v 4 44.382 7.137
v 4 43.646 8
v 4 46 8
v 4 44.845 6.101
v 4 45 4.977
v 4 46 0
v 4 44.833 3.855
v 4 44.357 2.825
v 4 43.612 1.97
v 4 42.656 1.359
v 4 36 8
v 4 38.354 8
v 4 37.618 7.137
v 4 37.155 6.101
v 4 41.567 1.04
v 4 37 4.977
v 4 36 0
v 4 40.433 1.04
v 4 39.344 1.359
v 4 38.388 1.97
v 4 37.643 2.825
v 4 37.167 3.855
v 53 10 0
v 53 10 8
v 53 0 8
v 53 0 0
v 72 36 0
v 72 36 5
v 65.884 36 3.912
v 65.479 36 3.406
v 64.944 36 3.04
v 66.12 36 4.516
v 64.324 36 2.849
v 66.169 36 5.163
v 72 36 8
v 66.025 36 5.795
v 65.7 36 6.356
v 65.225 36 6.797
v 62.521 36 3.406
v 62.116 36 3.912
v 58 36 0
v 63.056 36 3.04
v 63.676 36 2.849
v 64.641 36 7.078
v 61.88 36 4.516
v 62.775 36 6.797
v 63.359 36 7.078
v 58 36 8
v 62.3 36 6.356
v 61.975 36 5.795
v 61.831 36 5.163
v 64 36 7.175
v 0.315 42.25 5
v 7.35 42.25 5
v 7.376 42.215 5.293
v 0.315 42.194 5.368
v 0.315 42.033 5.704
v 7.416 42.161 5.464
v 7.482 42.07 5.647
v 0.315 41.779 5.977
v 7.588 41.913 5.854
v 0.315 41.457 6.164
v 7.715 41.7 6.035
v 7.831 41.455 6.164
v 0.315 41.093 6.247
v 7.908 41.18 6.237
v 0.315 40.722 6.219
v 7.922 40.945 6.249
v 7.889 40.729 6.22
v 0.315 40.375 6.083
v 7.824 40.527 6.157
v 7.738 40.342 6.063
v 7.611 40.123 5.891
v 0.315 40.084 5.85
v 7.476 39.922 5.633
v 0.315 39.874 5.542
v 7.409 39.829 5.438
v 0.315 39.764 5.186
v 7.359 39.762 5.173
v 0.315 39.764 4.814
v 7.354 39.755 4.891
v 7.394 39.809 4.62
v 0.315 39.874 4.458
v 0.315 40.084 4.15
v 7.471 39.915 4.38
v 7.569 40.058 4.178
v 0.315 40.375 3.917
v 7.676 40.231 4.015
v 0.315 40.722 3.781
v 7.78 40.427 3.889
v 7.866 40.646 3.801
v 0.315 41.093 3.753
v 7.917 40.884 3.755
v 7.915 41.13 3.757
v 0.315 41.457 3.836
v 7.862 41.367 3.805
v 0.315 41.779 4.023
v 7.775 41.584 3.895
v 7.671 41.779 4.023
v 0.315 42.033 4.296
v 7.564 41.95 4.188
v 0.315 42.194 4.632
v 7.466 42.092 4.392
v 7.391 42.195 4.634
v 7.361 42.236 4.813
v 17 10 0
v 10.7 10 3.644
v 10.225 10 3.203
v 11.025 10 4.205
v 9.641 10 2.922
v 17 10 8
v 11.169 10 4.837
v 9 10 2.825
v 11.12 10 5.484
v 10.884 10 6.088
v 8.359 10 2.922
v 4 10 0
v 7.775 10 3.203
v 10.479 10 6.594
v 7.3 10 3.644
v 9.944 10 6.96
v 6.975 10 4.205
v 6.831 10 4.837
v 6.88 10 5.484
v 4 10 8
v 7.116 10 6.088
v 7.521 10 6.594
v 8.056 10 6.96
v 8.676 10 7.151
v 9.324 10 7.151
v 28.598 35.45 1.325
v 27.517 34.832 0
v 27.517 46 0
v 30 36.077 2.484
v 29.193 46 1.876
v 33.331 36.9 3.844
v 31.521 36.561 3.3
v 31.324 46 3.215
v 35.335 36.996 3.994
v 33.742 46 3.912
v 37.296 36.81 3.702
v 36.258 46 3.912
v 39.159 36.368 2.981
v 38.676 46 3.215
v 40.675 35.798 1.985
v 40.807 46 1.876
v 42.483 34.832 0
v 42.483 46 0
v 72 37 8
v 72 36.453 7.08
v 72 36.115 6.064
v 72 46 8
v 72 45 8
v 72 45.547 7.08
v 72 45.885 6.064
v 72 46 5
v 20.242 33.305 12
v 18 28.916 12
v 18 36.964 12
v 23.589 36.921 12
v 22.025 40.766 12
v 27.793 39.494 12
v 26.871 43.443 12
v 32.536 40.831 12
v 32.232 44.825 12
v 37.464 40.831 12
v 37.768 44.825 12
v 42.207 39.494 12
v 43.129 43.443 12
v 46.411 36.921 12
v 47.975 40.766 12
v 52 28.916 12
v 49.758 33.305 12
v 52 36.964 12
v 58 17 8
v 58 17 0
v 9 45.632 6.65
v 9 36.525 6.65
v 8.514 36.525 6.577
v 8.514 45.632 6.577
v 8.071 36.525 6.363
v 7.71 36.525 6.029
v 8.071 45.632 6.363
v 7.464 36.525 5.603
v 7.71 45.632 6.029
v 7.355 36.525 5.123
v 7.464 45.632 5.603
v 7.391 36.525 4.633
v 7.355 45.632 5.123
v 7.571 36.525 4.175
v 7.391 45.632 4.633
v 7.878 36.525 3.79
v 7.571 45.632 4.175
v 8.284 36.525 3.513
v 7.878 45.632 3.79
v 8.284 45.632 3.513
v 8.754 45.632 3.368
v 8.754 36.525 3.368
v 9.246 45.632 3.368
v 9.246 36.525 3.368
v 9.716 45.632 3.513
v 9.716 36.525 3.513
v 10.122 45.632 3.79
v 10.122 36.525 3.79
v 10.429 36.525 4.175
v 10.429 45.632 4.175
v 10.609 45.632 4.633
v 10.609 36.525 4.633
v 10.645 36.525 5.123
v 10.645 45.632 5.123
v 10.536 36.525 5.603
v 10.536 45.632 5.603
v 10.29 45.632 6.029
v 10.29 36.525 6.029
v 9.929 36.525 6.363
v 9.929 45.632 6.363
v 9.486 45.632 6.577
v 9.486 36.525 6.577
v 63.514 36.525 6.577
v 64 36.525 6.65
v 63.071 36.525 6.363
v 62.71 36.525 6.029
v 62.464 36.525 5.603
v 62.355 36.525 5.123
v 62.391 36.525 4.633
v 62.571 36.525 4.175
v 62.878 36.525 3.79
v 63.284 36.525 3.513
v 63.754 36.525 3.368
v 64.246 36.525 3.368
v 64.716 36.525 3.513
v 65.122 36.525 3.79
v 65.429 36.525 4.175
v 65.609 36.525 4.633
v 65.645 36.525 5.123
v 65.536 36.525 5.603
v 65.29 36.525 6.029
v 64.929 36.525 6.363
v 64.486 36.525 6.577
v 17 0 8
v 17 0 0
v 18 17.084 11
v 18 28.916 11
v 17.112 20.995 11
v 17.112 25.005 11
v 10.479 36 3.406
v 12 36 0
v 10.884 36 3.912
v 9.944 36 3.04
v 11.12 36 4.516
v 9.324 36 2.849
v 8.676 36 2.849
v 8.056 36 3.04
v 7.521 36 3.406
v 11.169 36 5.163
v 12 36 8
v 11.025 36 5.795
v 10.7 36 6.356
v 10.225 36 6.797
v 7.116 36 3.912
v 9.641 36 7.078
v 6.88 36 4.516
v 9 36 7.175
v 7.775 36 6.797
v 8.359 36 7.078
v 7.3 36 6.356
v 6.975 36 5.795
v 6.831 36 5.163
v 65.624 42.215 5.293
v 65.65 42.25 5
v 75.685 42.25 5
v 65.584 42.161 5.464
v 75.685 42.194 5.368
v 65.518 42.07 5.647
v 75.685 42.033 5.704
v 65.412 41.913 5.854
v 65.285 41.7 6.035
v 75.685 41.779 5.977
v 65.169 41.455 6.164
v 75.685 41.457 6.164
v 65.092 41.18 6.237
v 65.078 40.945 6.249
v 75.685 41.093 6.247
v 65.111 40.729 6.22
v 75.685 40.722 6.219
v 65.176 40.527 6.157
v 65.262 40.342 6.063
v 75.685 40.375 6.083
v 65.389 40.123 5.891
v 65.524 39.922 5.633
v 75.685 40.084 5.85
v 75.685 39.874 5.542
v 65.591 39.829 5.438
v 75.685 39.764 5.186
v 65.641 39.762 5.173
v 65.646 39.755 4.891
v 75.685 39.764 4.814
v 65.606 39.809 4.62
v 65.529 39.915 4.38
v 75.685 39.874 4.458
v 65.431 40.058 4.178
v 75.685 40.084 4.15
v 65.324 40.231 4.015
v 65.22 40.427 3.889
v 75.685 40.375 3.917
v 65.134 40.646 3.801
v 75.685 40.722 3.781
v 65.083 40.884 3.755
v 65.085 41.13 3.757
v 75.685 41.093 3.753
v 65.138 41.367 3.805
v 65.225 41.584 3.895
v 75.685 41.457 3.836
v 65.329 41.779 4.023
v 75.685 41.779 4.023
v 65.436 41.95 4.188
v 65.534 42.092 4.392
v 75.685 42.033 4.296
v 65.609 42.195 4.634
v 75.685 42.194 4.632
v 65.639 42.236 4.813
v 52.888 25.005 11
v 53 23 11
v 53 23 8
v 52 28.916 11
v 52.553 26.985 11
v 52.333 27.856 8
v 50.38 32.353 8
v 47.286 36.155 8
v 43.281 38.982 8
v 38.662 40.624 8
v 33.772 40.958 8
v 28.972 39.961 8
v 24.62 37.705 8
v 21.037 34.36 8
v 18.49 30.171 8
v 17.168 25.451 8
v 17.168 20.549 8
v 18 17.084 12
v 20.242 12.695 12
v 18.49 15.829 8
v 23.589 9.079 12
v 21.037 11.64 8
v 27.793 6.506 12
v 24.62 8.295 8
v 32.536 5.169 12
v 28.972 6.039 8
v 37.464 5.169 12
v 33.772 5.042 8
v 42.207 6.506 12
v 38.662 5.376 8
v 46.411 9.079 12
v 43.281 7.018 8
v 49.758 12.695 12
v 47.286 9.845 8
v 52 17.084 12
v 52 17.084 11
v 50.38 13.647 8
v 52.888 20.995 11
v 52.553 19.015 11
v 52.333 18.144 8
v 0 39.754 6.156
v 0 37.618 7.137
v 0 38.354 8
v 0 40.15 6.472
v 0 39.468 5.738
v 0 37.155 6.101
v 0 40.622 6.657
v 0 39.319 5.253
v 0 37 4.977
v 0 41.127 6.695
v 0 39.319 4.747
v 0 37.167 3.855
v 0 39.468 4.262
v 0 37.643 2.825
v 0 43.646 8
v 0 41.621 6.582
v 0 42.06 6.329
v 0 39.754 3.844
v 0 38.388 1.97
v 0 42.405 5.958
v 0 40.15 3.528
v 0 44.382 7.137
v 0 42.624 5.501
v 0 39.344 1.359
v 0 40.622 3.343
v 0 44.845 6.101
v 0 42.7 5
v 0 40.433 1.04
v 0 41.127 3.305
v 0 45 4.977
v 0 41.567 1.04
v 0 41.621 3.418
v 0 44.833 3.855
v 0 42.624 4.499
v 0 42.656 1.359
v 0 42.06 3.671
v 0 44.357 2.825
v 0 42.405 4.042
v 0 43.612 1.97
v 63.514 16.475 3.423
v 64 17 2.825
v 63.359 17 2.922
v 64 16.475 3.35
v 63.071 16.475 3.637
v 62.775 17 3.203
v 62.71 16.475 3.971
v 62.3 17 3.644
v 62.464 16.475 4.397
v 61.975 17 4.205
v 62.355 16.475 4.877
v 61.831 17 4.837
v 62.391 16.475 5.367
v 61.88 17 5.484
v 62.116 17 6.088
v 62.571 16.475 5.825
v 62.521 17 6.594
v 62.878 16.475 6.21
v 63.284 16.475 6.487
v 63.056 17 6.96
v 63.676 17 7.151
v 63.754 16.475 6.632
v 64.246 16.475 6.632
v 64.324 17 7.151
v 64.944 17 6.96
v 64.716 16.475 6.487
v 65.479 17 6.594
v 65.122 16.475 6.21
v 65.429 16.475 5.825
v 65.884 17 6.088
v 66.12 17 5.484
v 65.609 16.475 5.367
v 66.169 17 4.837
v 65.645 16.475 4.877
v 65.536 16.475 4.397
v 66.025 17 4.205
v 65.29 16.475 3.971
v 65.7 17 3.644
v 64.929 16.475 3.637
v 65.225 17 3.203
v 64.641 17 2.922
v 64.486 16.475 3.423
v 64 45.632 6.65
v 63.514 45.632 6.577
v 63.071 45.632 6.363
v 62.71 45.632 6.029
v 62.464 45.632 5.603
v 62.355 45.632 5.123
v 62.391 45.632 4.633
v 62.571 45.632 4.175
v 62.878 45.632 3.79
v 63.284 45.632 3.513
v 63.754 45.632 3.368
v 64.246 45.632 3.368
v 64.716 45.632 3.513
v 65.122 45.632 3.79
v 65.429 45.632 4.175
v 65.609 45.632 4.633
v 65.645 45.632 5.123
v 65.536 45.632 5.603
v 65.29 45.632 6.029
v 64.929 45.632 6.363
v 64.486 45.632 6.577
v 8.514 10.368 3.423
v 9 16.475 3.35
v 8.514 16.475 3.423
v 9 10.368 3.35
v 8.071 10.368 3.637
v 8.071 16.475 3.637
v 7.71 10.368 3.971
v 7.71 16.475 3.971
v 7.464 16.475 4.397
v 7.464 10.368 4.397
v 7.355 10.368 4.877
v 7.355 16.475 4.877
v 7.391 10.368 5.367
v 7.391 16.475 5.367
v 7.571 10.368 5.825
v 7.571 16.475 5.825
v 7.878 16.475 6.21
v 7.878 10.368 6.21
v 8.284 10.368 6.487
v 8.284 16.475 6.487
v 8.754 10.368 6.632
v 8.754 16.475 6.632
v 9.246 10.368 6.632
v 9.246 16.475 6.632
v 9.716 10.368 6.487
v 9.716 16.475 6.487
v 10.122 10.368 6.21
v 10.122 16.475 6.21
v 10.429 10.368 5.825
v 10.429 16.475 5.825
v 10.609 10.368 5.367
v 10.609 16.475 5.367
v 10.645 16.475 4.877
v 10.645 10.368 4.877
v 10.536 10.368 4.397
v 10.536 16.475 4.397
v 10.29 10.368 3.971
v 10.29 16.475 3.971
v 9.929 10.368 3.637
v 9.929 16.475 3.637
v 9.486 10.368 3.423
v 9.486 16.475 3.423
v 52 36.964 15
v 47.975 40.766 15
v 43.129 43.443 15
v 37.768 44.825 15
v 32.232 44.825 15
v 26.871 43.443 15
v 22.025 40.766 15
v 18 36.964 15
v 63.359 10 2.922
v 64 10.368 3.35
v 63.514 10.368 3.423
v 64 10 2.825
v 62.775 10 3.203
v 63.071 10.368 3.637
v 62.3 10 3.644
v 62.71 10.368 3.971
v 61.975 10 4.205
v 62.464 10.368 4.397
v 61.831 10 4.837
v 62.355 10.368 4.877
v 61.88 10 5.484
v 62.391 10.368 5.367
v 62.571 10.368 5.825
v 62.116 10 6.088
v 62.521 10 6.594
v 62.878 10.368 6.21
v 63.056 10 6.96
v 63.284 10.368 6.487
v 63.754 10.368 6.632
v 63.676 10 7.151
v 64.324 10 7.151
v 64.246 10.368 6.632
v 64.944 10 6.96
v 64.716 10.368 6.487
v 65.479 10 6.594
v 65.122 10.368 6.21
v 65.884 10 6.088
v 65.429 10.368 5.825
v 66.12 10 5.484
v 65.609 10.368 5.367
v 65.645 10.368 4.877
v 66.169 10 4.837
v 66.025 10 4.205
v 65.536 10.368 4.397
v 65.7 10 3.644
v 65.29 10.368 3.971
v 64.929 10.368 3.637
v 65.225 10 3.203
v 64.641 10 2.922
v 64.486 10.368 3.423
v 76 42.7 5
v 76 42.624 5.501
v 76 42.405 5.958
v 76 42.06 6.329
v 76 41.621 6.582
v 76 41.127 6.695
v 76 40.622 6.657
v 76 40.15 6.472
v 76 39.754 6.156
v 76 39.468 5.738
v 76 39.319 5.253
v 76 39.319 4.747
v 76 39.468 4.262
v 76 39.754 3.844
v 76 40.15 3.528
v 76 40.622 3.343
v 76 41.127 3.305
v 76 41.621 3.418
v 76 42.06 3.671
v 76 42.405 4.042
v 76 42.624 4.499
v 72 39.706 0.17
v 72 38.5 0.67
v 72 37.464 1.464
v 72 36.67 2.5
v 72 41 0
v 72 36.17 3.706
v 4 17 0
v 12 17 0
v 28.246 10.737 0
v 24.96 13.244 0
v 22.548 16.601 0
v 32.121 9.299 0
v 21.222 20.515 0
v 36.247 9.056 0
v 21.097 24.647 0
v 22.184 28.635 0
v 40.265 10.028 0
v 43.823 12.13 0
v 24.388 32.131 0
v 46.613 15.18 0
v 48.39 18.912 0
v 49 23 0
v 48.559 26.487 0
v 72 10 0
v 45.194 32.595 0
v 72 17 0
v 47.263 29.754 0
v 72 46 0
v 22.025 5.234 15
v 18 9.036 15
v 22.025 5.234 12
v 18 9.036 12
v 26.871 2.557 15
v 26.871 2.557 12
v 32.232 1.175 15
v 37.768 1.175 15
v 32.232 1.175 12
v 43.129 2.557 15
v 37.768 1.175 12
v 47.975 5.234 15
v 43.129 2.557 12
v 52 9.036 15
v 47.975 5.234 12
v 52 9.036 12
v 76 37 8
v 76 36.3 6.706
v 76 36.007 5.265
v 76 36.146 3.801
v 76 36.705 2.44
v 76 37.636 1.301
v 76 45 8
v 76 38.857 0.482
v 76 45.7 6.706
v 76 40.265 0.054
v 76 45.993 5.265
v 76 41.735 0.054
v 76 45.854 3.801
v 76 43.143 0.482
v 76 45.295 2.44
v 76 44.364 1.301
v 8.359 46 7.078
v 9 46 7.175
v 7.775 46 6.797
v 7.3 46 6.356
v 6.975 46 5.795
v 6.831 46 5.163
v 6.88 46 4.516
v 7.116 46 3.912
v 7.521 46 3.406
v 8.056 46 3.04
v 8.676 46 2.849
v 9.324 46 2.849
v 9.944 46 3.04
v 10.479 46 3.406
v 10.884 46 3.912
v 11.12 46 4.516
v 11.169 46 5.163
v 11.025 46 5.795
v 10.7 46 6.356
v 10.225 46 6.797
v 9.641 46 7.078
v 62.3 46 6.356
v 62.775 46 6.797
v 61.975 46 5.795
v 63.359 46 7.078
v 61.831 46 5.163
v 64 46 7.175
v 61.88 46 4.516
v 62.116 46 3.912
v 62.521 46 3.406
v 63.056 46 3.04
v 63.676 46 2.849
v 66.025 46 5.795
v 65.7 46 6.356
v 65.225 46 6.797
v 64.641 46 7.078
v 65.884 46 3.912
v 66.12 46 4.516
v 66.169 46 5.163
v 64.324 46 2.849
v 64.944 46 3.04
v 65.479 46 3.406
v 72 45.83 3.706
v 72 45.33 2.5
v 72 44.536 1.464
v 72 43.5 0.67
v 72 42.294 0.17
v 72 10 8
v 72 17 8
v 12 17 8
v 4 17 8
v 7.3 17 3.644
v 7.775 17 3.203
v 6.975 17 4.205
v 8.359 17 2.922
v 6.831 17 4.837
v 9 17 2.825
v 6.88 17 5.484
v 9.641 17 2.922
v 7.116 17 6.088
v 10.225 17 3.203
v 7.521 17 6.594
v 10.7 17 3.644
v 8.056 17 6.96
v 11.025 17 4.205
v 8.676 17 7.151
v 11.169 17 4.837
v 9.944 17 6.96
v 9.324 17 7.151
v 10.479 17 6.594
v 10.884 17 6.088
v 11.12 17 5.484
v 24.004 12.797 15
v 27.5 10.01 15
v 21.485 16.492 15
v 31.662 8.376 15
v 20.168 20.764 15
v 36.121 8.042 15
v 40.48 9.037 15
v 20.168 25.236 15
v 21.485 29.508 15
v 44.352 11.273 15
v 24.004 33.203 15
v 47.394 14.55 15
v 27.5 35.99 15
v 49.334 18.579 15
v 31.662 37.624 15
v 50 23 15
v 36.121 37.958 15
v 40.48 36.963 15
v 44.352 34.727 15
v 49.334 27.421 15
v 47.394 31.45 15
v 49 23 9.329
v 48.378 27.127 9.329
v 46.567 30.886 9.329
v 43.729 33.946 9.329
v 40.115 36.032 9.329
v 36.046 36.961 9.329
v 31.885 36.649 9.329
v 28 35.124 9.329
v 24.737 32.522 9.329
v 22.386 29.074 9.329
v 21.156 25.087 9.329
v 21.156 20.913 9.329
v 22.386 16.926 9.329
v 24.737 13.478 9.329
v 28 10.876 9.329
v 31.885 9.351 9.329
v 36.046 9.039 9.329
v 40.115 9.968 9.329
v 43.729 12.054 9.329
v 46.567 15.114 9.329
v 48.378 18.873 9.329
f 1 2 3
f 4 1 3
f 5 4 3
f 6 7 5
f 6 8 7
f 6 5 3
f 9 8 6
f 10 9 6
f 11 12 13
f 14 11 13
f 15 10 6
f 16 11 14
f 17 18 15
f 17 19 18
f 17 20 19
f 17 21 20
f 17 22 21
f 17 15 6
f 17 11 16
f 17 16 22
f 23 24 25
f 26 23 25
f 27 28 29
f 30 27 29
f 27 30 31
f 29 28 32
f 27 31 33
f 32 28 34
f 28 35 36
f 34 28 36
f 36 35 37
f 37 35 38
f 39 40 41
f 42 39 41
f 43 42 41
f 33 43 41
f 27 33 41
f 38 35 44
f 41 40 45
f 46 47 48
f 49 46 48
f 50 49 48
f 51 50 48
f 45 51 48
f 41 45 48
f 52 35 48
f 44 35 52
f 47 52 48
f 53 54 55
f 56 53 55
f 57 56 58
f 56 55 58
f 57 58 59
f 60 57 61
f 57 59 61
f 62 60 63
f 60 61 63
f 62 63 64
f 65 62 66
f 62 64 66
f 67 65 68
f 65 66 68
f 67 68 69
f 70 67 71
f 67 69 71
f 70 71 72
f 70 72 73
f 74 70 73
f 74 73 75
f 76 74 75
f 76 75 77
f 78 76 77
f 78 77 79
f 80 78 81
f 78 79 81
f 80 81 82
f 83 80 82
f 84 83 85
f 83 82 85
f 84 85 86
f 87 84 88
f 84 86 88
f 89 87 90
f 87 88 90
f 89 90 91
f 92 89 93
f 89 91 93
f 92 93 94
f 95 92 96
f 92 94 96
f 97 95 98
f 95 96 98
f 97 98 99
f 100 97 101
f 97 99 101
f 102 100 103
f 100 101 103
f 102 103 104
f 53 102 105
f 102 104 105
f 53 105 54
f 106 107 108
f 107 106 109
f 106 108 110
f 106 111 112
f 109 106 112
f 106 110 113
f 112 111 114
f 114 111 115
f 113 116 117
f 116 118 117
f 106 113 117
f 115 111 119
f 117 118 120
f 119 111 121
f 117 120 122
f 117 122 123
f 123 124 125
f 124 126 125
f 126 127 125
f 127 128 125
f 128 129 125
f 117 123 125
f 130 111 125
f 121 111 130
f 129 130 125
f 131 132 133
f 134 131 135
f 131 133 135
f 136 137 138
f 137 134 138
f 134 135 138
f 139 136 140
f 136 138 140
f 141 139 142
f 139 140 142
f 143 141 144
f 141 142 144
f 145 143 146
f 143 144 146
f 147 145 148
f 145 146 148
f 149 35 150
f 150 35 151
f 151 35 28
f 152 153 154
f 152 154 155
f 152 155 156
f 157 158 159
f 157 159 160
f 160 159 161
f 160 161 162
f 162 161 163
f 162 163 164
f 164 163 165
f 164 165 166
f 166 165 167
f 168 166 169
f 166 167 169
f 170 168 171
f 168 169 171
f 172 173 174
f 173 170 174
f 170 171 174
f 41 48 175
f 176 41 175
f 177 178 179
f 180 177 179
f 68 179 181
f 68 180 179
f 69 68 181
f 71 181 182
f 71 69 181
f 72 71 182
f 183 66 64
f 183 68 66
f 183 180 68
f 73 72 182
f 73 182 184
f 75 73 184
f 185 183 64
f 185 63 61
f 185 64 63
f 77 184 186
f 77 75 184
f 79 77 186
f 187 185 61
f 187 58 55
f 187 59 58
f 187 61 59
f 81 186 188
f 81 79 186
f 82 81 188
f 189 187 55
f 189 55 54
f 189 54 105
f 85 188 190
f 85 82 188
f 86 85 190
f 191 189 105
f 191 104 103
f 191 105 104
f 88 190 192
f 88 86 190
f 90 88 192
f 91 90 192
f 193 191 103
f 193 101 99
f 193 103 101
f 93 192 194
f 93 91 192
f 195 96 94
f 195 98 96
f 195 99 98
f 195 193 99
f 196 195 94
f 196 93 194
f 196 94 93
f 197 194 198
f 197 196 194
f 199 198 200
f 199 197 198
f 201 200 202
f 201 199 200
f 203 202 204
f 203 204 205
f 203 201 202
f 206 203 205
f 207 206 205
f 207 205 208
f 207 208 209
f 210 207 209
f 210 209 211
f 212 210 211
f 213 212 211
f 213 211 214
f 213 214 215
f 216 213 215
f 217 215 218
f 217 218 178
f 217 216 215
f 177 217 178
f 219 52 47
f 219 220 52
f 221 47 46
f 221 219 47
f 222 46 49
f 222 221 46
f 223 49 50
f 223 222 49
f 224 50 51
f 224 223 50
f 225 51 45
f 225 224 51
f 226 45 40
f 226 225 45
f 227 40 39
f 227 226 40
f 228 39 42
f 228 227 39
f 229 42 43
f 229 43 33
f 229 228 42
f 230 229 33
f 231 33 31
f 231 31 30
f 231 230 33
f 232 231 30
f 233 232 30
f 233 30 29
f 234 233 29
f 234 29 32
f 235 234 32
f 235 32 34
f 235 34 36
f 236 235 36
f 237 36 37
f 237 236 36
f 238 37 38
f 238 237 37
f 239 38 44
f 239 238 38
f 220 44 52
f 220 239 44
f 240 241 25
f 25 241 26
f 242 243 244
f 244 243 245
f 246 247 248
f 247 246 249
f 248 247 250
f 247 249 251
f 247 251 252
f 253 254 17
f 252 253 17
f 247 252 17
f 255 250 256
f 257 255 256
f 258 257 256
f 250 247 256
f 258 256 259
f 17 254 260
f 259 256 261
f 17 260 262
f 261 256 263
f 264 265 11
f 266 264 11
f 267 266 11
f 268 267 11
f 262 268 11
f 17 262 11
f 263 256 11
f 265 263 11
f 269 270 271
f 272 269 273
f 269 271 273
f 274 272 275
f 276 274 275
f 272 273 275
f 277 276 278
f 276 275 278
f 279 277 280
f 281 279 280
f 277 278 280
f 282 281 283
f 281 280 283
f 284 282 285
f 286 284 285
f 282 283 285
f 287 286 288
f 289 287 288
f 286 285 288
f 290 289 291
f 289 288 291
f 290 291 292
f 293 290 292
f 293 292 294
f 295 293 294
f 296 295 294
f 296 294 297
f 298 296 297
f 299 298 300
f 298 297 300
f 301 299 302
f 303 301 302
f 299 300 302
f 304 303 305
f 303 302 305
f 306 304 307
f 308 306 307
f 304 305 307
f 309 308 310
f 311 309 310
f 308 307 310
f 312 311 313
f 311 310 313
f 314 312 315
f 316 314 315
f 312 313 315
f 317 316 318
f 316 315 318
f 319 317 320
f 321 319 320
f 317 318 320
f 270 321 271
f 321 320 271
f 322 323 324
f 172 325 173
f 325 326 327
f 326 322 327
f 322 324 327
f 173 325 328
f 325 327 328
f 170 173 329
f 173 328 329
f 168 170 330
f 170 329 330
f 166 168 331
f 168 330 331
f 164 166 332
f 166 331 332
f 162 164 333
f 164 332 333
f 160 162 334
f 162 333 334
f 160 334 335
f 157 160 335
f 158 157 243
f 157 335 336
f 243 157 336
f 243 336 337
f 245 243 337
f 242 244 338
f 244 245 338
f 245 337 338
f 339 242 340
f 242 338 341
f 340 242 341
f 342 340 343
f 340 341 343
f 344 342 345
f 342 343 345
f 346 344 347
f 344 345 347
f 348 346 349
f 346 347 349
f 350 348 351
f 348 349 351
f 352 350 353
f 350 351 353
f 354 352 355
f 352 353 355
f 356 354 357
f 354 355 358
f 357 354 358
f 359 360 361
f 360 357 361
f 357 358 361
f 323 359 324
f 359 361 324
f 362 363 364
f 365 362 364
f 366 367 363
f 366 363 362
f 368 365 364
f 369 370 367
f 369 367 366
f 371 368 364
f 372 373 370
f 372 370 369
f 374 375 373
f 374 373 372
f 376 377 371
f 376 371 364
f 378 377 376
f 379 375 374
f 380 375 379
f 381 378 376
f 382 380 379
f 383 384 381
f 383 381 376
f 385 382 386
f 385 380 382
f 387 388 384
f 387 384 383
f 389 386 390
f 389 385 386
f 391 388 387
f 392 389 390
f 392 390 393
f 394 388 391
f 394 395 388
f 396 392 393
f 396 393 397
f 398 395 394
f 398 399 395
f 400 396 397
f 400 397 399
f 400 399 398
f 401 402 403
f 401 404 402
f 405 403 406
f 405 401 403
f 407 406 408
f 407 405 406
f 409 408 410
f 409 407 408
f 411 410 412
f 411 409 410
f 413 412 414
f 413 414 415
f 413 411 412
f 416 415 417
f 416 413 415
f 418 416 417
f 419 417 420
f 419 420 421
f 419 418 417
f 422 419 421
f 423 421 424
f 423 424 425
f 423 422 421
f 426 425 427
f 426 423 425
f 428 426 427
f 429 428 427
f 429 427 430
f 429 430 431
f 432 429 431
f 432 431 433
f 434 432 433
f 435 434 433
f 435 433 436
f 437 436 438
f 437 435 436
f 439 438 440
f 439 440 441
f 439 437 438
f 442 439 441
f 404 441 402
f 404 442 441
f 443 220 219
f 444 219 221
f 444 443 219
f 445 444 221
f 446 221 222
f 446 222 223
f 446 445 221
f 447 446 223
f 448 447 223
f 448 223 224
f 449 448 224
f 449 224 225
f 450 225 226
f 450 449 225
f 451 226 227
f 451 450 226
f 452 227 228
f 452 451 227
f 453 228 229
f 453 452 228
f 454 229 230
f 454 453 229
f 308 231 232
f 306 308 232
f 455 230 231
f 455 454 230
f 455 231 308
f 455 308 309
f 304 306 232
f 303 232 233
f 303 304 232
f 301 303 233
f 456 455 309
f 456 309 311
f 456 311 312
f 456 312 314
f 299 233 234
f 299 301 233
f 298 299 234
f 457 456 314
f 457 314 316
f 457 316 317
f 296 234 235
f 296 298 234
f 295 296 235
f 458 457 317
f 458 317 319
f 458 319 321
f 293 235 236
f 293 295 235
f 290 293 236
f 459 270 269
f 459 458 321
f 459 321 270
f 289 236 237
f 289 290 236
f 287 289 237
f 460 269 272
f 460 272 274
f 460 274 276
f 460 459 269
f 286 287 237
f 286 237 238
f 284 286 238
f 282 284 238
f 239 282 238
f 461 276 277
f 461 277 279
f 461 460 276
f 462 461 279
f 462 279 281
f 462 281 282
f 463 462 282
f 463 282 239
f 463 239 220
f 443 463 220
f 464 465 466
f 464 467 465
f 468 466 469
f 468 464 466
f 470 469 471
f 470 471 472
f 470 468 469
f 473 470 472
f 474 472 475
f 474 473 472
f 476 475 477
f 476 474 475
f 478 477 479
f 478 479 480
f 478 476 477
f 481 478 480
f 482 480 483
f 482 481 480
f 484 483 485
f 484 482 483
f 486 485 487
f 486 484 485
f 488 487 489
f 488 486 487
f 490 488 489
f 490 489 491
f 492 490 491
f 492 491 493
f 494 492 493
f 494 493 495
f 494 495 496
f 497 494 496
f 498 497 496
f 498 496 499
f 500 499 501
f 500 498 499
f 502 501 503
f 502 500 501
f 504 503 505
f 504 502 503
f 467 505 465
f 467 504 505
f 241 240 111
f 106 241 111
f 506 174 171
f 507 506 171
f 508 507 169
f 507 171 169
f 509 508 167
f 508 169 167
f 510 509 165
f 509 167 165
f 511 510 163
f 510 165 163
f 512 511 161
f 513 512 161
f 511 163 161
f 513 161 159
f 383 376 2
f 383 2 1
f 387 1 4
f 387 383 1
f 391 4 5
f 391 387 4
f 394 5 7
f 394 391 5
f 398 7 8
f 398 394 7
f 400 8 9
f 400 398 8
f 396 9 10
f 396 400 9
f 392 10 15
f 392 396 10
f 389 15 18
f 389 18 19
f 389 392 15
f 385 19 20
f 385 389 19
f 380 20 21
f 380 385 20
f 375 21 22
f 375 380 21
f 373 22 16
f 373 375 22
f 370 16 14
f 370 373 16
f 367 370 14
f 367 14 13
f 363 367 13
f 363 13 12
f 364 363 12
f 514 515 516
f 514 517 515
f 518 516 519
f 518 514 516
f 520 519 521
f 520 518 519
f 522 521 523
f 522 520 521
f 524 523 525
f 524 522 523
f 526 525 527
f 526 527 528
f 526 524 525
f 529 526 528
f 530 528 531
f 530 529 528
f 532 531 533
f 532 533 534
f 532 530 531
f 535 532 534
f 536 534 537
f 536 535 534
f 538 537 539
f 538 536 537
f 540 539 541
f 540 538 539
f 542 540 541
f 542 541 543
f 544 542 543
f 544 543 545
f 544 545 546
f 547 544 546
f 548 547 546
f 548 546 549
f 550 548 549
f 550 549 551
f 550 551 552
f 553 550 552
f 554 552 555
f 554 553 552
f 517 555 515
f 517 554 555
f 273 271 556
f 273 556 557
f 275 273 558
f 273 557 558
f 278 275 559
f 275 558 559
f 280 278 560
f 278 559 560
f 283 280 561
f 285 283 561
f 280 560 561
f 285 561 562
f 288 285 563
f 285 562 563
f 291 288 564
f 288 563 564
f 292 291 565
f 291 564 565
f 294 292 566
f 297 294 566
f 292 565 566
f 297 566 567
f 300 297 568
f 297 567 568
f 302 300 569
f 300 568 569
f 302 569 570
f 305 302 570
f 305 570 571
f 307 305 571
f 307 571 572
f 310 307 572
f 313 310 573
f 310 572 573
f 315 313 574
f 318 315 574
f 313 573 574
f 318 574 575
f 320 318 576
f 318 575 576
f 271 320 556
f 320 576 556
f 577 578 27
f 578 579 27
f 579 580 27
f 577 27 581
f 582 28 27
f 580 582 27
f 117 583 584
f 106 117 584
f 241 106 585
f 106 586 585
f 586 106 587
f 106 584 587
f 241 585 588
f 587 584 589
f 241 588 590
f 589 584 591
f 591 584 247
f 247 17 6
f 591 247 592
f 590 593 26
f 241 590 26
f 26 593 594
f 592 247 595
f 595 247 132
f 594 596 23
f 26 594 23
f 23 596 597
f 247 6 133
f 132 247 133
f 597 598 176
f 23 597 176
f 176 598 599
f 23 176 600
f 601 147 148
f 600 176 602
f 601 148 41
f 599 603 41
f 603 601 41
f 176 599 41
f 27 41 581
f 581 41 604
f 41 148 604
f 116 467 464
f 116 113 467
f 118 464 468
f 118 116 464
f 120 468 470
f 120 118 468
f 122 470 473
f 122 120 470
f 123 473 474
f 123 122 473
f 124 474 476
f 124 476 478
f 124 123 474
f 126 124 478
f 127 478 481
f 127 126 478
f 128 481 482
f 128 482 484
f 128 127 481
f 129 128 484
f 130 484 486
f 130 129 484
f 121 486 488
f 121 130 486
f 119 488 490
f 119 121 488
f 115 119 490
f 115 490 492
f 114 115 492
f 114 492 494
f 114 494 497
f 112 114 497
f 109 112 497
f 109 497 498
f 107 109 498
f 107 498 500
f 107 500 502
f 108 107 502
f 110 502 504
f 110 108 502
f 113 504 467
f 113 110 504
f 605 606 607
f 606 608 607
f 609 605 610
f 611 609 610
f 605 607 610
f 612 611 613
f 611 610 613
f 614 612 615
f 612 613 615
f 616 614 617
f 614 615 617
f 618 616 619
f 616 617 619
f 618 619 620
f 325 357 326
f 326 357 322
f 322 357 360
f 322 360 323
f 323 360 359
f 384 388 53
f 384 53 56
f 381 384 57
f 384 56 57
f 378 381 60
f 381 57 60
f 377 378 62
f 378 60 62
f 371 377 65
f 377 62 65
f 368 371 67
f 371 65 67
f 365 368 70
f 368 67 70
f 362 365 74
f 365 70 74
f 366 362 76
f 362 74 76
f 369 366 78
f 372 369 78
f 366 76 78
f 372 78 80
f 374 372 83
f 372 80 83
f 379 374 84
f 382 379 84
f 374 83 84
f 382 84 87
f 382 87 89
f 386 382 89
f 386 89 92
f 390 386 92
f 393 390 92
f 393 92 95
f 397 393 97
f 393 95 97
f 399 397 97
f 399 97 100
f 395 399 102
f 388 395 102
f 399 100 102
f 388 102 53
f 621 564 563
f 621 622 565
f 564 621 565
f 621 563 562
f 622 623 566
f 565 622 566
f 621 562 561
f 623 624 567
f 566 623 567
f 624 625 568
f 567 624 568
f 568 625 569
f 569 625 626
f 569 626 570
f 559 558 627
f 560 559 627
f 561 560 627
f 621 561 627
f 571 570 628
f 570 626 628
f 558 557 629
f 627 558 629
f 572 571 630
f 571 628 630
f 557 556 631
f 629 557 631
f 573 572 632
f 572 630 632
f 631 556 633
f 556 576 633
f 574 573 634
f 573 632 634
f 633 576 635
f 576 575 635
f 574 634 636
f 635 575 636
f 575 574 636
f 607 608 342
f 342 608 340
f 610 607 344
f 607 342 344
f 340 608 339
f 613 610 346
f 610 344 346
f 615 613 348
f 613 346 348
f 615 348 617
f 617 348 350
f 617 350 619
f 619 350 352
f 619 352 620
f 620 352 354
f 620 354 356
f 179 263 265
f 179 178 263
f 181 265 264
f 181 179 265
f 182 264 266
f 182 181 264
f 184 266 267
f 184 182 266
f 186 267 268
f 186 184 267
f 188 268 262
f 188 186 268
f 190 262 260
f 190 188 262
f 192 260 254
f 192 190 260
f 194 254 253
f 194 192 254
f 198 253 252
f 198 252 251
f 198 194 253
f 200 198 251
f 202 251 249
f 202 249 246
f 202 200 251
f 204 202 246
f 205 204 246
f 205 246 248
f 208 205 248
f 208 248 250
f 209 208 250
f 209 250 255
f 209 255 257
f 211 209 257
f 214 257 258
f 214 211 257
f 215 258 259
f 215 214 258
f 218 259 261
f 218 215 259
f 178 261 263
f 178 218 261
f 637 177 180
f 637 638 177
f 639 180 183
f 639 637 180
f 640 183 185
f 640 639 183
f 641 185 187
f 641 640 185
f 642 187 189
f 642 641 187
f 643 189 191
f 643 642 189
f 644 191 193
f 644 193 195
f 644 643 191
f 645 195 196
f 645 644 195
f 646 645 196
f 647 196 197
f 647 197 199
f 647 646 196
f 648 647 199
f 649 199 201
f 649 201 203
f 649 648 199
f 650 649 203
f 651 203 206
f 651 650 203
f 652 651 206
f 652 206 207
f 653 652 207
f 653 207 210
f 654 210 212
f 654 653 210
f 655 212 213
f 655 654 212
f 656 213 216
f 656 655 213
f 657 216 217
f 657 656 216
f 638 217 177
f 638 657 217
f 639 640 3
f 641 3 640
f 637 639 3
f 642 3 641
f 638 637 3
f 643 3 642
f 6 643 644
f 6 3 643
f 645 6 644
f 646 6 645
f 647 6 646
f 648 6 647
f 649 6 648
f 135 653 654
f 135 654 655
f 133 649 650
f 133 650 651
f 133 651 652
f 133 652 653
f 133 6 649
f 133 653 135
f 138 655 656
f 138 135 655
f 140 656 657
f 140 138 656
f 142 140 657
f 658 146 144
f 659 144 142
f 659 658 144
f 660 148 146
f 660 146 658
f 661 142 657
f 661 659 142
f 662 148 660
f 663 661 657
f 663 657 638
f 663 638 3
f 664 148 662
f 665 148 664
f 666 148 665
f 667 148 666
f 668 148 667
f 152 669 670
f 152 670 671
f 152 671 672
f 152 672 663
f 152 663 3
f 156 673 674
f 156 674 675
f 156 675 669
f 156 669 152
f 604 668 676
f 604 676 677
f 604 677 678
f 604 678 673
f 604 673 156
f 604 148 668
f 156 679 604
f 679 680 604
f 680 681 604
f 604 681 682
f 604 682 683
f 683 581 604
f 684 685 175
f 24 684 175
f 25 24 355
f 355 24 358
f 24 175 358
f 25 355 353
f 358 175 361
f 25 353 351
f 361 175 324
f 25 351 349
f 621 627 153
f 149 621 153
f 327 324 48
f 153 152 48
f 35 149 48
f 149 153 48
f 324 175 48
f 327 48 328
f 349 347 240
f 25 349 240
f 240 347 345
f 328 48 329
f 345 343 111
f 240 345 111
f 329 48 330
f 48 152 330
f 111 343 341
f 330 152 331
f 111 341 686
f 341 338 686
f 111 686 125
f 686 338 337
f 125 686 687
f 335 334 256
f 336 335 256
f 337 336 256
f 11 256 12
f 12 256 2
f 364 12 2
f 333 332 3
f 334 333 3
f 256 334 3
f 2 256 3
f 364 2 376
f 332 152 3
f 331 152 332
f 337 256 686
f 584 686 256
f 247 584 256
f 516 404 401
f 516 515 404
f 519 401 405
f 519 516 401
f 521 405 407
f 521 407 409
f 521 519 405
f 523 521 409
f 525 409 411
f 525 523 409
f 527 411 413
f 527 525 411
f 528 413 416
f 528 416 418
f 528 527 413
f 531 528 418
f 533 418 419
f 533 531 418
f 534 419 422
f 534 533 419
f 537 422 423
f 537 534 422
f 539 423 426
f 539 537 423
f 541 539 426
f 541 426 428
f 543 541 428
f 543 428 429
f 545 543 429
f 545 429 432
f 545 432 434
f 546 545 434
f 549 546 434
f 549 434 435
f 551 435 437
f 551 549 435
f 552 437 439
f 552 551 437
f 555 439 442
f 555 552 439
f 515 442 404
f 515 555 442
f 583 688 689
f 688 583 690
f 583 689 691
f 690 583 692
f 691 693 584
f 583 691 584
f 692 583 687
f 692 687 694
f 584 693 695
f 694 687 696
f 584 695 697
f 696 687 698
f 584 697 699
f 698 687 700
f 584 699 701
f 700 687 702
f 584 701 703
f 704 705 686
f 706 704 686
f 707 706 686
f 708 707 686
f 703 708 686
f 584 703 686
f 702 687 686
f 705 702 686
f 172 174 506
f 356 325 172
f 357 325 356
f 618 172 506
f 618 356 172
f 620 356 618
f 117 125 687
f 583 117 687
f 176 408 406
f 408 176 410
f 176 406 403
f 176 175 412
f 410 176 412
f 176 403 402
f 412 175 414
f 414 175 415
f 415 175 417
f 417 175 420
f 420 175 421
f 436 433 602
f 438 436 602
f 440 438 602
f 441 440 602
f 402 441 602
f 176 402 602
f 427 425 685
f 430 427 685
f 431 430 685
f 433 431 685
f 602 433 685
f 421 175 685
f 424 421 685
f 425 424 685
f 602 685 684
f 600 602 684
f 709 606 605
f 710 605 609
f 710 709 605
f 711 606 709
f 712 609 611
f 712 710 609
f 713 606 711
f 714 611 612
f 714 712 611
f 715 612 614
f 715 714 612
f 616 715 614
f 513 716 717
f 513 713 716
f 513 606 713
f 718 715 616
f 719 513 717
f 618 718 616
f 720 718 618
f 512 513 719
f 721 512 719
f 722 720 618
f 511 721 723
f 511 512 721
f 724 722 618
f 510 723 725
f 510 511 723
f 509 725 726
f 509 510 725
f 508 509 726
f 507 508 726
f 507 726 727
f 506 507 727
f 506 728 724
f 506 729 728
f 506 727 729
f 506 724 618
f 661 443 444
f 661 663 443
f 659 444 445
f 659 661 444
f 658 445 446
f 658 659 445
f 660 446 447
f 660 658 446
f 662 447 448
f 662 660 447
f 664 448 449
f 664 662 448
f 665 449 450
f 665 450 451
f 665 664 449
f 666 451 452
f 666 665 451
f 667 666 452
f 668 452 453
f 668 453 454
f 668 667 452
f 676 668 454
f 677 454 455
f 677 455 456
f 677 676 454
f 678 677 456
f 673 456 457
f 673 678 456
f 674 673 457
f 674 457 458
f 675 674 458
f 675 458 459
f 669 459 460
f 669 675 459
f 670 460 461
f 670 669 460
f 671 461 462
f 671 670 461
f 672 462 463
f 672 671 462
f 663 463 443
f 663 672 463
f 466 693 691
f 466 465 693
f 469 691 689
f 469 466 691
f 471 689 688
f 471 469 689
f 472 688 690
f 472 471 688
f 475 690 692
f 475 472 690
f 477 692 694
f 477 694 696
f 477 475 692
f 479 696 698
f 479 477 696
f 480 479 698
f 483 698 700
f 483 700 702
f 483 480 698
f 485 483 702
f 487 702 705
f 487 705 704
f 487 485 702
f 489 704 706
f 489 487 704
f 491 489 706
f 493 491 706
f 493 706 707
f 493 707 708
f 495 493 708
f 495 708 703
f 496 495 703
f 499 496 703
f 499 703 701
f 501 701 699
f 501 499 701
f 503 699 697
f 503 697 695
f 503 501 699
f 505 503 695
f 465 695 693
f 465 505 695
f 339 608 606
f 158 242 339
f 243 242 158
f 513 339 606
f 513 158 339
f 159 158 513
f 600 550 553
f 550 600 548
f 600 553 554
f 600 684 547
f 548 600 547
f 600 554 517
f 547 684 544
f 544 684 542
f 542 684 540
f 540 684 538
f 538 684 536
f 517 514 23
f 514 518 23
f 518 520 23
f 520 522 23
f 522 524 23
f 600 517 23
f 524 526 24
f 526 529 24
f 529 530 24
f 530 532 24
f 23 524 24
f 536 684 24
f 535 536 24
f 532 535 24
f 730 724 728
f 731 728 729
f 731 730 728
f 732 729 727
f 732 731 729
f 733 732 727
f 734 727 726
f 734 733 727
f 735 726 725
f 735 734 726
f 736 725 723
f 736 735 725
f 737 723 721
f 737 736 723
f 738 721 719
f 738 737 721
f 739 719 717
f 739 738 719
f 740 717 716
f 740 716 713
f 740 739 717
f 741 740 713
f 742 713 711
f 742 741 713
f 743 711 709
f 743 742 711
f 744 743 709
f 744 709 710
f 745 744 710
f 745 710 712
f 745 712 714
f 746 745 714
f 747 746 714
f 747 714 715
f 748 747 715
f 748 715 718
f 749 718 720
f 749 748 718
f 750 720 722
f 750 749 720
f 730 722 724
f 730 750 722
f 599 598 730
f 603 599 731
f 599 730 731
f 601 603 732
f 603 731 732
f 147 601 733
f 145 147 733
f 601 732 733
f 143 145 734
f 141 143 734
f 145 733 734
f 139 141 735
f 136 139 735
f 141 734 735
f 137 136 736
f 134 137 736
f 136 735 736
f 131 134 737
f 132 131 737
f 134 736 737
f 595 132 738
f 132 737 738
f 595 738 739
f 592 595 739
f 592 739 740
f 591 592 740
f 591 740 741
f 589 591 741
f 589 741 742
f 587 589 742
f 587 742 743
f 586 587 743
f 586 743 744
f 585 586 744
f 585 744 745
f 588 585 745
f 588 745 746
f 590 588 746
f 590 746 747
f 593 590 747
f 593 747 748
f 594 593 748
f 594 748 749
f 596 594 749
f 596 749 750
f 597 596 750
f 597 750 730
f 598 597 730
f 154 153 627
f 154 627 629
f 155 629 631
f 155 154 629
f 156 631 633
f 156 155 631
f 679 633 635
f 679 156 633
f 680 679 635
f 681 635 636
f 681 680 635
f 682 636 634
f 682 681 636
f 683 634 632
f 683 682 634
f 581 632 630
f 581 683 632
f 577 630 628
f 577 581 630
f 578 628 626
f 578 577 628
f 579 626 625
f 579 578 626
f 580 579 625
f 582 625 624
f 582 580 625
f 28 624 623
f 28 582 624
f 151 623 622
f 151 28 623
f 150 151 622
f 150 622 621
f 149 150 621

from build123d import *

# Parameters (mm, degrees)
SKETCH_1_W                 = 76
SKETCH_1_H                 = 46
EXTRUDE_1_DEPTH            = 15
CUT_EXTRUDE_1_REACH        = 92.094
SKETCH_2_R                 = 14
CUT_EXTRUDE_3_DEPTH        = 91.094394942
CUT_EXTRUDE_4_REACH        = 92.094
CUT_EXTRUDE_4_END_RADIUS   = 14
HOLE_WIZARD_M41_AT_2_COUNT = 2
HOLE_WIZARD_M41_AT_2_PITCH = 55
HOLE_WIZARD_M42_AT_2_COUNT = 2
HOLE_WIZARD_M42_AT_2_PITCH = 55
SKETCH_15_W                = 4
SKETCH_15_H                = 6.19823693
SKETCH_15_H_2              = 5.19823693
CUT_EXTRUDE_START          = -4
CUT_EXTRUDE_5_DEPTH        = 4


# Read off the part's stored shape, not the designer's step: Отверстие обработанное метчиком M31, Отверстие обработанное метчиком M32
with BuildPart() as part:
    # Эскиз1 → Бобышка-Вытянуть1 (new body)
    with BuildSketch(Plane.XY):
        with Locations((38, 23)):
            Rectangle(SKETCH_1_W, SKETCH_1_H)
    extrude(amount=EXTRUDE_1_DEPTH)

    # Эскиз2 → Вырез-Вытянуть1 (cut, up to next)
    with BuildSketch(Plane.XY.offset(15), mode=Mode.PRIVATE) as cut_extrude_1_sk1:
        with Locations((35, 23)):
            Circle(SKETCH_2_R)
    cut_extrude_1_tool1 = extrude(cut_extrude_1_sk1.sketch, amount=-CUT_EXTRUDE_1_REACH, mode=Mode.PRIVATE) & part.part
    add(cut_extrude_1_tool1.solids().sort_by_distance((35, 23, 15))[0], mode=Mode.SUBTRACT)

    # Эскиз3 → Вырез-Вытянуть3 (cut, through all)
    with BuildSketch(Plane.XY.offset(15)):
        Polygon((17, 10), (4, 10), (4, 17), (12, 17), (12, 36), (0, 36), (0, 0), (17, 0), align=None)
        Polygon((53, 10), (53, 0), (76, 0), (76, 36), (58, 36), (58, 17), (72, 17), (72, 10), align=None)
    extrude(amount=-CUT_EXTRUDE_3_DEPTH, mode=Mode.SUBTRACT)

    # Вырез-Вытянуть4: up to this cylinder (the profile starts outside it)
    cut_extrude_4_end = Plane(origin=(35, 23, 1.635023), z_dir=(0, 0, 1)) * Cylinder(CUT_EXTRUDE_4_END_RADIUS, 213.188, mode=Mode.PRIVATE)
    # Эскиз4 → Вырез-Вытянуть4 (cut, up to the surface)
    with BuildSketch(Plane(origin=(0, 46, 0), x_dir=(1, 0, 0), z_dir=(0, 1, 0)), mode=Mode.PRIVATE) as cut_extrude_4_sk1:
        with BuildLine():
            Line((42.483314774, 0), (27.516685226, 0))
            ThreePointArc((27.516685226, 0), (35, -4), (42.483314774, 0))
        make_face()
    cut_extrude_4_tool1 = extrude(cut_extrude_4_sk1.sketch, amount=-CUT_EXTRUDE_4_REACH, mode=Mode.PRIVATE) - cut_extrude_4_end
    add(cut_extrude_4_tool1.solids().sort_by_distance((35, 46, 1.635023))[0], mode=Mode.SUBTRACT)

    # Эскиз5 → Вырез-Повернуть1 (revolve, cut)
    with BuildSketch(Plane(origin=(0, 23, 0), x_dir=(-1, 0, 0), z_dir=(0, 1, 0)), mode=Mode.PRIVATE) as cut_revolve_1_sk:
        Polygon((15, 15), (-13, 15), (-13, 12), (-17, 12), (-17, 8), (15, 8), align=None)
        Polygon((-21.564689936, 15), (-20, 15), (-21.564689936, 6.126202411), align=None)
    revolve(cut_revolve_1_sk.sketch.rotate(Axis((35, 23, 0), (0, 0, 1)), 180), axis=Axis((35, 23, 0), (0, 0, 1)), mode=Mode.SUBTRACT)

    # Эскиз6 → Отверстие обработанное метчиком M41 (revolve, cut)
    with BuildSketch(Plane(origin=(9, 46, 5), x_dir=(0, 0, 1), z_dir=(1, 0, 0))):
        Polygon((0, 0), (0, 10), (2.175, 10), (1.65, 9.475), (1.65, 0.367608958), (2.175, 0), align=None)
    hole_wizard_m41 = revolve(axis=Axis((9, 52.35, 5), (0, -1, 0)), mode=Mode.SUBTRACT)

    # Отверстие обработанное метчиком M41 at 2: Отверстие обработанное метчиком M41 ×2
    with Locations(*[(i * HOLE_WIZARD_M41_AT_2_PITCH, 0, 0) for i in range(1, HOLE_WIZARD_M41_AT_2_COUNT)]):
        add(hole_wizard_m41, mode=Mode.SUBTRACT)

    # Эскиз8 → Отверстие обработанное метчиком M42 (revolve, cut)
    with BuildSketch(Plane(origin=(64, 10, 5), x_dir=(0, 0, -1), z_dir=(1, 0, 0))):
        Polygon((0, 0), (0, 7), (2.175, 7), (1.65, 6.475), (1.65, 0.367608958), (2.175, 0), align=None)
    hole_wizard_m42 = revolve(axis=Axis((64, 3.65, 5), (0, 1, 0)), mode=Mode.SUBTRACT)

    # Отверстие обработанное метчиком M42 at 2: Отверстие обработанное метчиком M42 ×2
    with Locations(*[(-i * HOLE_WIZARD_M42_AT_2_PITCH, 0, 0) for i in range(1, HOLE_WIZARD_M42_AT_2_COUNT)]):
        add(hole_wizard_m42, mode=Mode.SUBTRACT)

    # Отверстие обработанное метчиком M31 outline → Отверстие обработанное метчиком M31 (revolve, cut)
    with BuildSketch(Plane(origin=(0, 41, 5), x_dir=(0, 1, 0), z_dir=(0, 0, -1))):
        Polygon((1.25, 0.315093392), (1.25, 7.923293242), (0, 7.923293242), (0, 0), (1.7, 0), align=None)
    revolve(axis=Axis((0, 41, 5), (1, 0, 0)), mode=Mode.SUBTRACT)

    # Отверстие обработанное метчиком M32 outline → Отверстие обработанное метчиком M32 (revolve, cut)
    with BuildSketch(Plane(origin=(0, 41, 5), x_dir=(0, 1, 0), z_dir=(0, 0, -1))):
        Polygon((0, 65.076706758), (1.25, 65.076706758), (1.25, 75.684906608), (1.7, 76), (0, 76), align=None)
    revolve(axis=Axis((0, 41, 5), (1, 0, 0)), mode=Mode.SUBTRACT)

    # Эскиз15 → Вырез-Повернуть2 (revolve, cut)
    with BuildSketch(Plane(origin=(0, 0, 5), x_dir=(-1, 0, 0), z_dir=(0, 0, -1)), mode=Mode.PRIVATE) as cut_revolve_2_sk:
        with Locations((-2, 33.900881535)):
            Rectangle(SKETCH_15_W, SKETCH_15_H)
        with Locations((-74, 33.400881535)):
            Rectangle(SKETCH_15_W, SKETCH_15_H_2)
    revolve(cut_revolve_2_sk.sketch.rotate(Axis((8.006810355, 41, 5), (-1, 0, 0)), 270), axis=Axis((8.006810355, 41, 5), (-1, 0, 0)), mode=Mode.SUBTRACT)

    # Эскиз16 → Вырез-Вытянуть5 (cut)
    with BuildSketch(Plane.XY.offset(15).offset(CUT_EXTRUDE_START)):
        with BuildLine():
            Line((18, 9.035759956), (18, 36.964240044))
            ThreePointArc((18, 36.964240044), (13, 23), (18, 9.035759956))
        make_face()
        with BuildLine():
            ThreePointArc((57, 23), (55.712315177, 30.416198487), (52, 36.964240044))
            Line((52, 36.964240044), (52, 9.035759956))
            ThreePointArc((52, 9.035759956), (55.712315177, 15.583801513), (57, 23))
        make_face()
    extrude(amount=CUT_EXTRUDE_5_DEPTH, mode=Mode.SUBTRACT)


solid = part.part
